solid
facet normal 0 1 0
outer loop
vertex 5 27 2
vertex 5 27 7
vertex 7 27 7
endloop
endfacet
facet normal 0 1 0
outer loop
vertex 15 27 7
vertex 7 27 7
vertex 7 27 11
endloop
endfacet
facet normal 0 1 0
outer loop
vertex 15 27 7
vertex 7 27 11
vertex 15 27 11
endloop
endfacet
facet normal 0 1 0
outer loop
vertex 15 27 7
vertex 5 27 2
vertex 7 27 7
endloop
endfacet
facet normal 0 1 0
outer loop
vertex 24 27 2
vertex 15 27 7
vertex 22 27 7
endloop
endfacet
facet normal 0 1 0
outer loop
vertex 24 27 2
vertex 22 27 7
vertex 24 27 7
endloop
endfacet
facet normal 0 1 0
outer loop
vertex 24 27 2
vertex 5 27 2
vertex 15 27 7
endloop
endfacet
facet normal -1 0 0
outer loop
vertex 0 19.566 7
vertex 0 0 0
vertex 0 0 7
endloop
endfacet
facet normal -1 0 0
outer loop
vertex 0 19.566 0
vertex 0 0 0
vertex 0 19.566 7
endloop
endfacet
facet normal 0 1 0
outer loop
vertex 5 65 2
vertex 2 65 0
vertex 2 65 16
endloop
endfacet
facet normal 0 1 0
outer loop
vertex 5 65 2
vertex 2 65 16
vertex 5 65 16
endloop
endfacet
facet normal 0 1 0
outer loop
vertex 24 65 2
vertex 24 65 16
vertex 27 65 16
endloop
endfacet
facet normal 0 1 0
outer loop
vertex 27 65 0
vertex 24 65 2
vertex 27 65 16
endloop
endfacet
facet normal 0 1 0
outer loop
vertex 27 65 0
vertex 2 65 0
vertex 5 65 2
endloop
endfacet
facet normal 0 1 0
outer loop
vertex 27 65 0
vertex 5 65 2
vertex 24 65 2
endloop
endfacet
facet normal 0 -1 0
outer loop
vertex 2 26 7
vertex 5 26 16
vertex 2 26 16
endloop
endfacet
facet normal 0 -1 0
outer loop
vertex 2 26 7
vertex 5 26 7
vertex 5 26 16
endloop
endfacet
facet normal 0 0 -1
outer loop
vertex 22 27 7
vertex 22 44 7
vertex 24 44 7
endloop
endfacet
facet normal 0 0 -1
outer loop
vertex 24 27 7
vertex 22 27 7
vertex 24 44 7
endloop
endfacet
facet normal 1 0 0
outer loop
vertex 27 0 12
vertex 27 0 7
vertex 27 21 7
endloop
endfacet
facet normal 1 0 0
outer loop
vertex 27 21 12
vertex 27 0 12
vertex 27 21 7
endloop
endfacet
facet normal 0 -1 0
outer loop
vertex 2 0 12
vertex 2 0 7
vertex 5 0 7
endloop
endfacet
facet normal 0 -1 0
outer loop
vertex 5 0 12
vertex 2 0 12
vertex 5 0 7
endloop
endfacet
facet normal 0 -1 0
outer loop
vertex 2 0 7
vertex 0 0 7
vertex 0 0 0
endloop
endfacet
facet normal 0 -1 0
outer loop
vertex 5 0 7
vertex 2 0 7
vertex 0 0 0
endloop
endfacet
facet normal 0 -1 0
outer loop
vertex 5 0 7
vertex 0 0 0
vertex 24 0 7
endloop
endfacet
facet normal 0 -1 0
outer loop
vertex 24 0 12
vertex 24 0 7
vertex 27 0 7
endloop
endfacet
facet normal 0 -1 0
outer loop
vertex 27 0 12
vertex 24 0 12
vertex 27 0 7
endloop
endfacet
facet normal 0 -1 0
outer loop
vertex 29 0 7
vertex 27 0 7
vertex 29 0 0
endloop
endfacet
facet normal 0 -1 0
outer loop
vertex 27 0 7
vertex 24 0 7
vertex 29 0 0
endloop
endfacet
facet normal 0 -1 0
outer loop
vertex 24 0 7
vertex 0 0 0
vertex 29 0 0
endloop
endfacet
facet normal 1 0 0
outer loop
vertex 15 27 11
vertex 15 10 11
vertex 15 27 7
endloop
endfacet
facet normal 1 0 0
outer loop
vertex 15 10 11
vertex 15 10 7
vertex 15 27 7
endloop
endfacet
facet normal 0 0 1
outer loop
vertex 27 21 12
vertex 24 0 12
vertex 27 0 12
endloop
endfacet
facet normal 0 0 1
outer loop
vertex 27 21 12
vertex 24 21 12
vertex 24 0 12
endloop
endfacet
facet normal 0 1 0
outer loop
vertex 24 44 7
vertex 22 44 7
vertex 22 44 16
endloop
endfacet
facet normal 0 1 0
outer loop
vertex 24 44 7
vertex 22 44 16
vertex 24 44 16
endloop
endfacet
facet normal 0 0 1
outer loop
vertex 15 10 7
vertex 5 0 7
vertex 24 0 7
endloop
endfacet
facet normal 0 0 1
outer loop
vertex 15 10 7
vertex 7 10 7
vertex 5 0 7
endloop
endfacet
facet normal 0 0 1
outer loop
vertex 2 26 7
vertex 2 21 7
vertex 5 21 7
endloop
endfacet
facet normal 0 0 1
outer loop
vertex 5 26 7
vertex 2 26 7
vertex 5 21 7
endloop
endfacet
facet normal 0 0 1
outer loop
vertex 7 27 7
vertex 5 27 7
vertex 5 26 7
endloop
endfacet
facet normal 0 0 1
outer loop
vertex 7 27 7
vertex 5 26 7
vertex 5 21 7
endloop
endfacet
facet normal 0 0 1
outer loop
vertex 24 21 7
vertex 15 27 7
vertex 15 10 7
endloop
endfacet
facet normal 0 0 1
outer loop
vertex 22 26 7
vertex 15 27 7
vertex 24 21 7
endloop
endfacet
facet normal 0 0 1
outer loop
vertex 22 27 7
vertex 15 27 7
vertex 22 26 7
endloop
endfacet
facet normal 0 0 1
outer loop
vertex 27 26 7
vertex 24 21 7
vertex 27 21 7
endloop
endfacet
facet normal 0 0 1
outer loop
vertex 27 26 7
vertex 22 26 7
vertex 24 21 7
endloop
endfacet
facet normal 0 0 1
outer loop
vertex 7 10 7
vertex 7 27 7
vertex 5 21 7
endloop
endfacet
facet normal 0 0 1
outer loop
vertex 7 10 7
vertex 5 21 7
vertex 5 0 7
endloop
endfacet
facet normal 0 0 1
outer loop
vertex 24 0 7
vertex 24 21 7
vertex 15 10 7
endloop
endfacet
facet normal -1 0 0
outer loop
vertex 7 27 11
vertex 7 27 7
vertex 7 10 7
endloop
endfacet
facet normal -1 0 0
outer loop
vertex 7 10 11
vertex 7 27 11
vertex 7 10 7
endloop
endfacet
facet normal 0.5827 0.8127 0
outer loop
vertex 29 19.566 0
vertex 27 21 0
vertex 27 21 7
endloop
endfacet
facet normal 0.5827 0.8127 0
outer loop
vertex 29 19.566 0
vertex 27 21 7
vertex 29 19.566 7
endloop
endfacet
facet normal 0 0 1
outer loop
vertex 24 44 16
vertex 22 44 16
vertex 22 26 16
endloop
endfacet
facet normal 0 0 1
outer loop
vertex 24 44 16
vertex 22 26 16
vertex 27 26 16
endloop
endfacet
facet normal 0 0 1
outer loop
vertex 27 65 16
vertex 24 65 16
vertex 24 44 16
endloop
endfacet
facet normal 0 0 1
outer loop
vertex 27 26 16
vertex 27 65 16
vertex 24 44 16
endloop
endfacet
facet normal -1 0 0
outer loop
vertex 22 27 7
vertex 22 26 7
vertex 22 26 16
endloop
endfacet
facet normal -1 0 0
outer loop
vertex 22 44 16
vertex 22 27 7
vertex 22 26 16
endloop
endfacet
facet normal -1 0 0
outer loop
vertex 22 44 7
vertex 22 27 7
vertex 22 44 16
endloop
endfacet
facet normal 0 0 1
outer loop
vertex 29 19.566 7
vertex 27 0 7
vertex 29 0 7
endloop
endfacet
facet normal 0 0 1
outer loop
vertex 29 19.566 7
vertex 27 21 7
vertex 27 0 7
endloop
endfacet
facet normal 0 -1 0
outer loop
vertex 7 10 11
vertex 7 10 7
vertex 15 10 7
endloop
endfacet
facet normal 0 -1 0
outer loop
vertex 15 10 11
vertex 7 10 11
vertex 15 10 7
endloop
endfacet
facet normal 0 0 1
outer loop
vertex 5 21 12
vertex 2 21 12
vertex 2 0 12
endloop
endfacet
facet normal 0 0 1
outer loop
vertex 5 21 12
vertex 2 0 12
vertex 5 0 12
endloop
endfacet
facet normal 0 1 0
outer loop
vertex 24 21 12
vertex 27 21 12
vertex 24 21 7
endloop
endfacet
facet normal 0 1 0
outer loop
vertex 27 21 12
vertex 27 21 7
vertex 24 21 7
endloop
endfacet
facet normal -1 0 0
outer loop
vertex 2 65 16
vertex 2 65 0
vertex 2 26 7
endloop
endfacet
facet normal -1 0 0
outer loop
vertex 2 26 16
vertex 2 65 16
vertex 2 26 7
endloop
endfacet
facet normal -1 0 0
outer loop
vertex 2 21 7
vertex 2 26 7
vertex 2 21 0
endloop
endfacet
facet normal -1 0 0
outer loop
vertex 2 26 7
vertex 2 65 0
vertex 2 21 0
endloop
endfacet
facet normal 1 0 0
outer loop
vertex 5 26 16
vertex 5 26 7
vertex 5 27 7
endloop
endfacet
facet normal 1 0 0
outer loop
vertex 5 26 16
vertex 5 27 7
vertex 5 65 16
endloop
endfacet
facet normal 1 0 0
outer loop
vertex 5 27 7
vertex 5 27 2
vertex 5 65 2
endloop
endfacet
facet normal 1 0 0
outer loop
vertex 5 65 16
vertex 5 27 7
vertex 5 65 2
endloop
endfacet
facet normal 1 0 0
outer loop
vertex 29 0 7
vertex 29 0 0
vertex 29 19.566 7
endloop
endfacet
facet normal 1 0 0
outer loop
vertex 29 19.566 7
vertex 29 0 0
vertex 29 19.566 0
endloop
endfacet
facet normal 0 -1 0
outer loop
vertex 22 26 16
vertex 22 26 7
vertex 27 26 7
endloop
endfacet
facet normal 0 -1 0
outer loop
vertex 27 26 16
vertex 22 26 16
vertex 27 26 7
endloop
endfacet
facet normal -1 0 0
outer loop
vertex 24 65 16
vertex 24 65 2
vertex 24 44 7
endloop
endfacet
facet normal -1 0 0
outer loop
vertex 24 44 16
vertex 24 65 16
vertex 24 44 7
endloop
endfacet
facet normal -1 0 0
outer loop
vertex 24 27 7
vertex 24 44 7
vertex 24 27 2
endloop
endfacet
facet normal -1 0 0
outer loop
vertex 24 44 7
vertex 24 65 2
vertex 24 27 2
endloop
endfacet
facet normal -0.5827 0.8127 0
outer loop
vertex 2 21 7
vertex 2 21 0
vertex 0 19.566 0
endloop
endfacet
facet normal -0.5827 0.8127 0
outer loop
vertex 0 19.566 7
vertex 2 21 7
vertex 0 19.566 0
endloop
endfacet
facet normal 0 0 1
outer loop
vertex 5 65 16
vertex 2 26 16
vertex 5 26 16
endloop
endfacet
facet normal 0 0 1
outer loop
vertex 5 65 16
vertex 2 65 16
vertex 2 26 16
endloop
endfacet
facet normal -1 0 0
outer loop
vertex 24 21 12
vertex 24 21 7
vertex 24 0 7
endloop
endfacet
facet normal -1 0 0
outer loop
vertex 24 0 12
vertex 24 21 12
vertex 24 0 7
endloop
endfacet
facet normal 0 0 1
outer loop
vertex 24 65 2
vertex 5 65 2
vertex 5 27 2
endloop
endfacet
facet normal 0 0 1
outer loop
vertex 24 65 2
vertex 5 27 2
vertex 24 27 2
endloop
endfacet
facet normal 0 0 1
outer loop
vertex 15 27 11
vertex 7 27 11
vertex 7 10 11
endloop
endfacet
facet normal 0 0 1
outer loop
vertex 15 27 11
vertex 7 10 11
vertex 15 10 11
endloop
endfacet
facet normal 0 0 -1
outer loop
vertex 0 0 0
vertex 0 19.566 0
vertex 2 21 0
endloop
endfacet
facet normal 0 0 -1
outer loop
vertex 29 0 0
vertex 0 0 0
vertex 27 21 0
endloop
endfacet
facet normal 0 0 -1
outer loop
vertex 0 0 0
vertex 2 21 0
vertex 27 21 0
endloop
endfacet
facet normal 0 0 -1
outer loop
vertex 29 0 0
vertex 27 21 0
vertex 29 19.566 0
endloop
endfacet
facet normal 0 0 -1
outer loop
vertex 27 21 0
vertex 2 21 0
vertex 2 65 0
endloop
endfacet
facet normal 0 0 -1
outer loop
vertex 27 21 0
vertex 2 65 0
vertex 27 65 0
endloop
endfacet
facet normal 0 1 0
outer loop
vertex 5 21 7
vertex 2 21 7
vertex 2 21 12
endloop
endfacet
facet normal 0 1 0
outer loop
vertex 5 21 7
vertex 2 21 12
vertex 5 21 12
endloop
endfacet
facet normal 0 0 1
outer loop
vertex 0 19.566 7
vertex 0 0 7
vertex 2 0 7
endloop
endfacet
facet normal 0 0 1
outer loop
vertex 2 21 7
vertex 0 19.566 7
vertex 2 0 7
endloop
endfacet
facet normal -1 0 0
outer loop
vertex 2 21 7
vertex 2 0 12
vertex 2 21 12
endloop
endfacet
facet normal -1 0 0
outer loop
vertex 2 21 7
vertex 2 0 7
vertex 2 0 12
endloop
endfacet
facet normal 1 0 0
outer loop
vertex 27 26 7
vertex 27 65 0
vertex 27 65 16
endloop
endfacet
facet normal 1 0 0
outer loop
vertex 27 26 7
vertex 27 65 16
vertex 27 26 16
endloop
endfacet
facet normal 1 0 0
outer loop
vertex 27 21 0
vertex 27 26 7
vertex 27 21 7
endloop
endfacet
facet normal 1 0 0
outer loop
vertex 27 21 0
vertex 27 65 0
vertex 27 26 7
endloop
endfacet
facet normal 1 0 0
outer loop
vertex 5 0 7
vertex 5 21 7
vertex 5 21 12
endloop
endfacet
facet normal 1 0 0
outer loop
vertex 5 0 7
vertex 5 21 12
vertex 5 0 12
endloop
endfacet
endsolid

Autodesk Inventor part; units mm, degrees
ref_plane "YZ Plane" through (0, 0, 0) normal (1, 0, 0) x (0, 1, 0)
ref_plane "XZ Plane" through (0, 0, 0) normal (0, 1, 0) x (-1, 0, 0)
ref_plane "XY Plane" through (0, 0, 0) normal (0, 0, 1) x (1, 0, 0)
sketch "Boceto1" plane through (0, 0, 0) normal (0, 0, 1) x (1, 0, 0)
  line L0 (0, 0) -> (0, 19.566)
  line L1 (2, 65) -> (2, 21)
  line L2 (2, 21) -> (0, 19.566)
  line L3 (2, 65) -> (14.5, 65)
  line L4 (29, 0) -> (29, 19.566)
  line L5 (27, 65) -> (27, 21)
  line L6 (27, 21) -> (29, 19.566)
  line L7 (27, 65) -> (14.5, 65)
  line L8 (0, 0) -> (29, 0)
extrude "Extrusión1" add sketch "Boceto1" along normal blind 7
sketch "Boceto2" plane through (0, 0, 7) normal (0, 0, 1) x (1, 0, 0)
  line L0 (27, 65) -> (27, 21) projected
  line L1 (2, 65) -> (27, 65) projected
  line L2 (2, 21) -> (2, 65) projected
  line L3 (2, 65) -> (5, 65)
  line L4 (2, 65) -> (2, 26)
  line L5 (5, 26) -> (5, 65)
  line L6 (27, 65) -> (24, 65)
  line L7 (24, 65) -> (24, 44)
  line L8 (27, 65) -> (27, 26)
  line L9 (5, 26) -> (2, 26)
  line L10 (24, 26) -> (27, 26)
  line L11 (24.1227, 26) -> (22, 26)
  line L12 (22, 26) -> (22, 44)
  line L13 (22, 44) -> (24, 44)
  dimension "d7" = 18
extrude "Extrusión2" add sketch "Boceto2" along normal blind 9
sketch "Boceto3" plane through (0, 0, 7) normal (0, 0, 1) x (1, 0, 0)
  line L0 (5, 65) -> (24, 65) projected
  line L1 (29, 0) -> (0, 0) projected
  line L2 (22, 44) -> (24, 44) projected
  line L3 (2, 0) -> (2, 21)
  line L4 (2, 21) -> (5, 21)
  line L5 (5, 21) -> (5, 0)
  line L6 (5, 0) -> (2, 0)
  line L7 (27, 0) -> (27, 21)
  line L8 (27, 21) -> (24, 21)
  line L9 (24, 21) -> (24, 0)
  line L10 (24, 0) -> (27, 0)
  dimension "d9" = 21
extrude "Extrusión3" add sketch "Boceto3" along normal blind 5
sketch "Boceto4" plane through (0, 0, 7) normal (0, 0, 1) x (1, 0, 0)
  line L0 (29, 0) -> (0, 0) projected
  line L1 (7, 10) -> (15, 10)
  line L2 (15, 10) -> (15, 27)
  line L3 (15, 27) -> (7, 27)
  line L4 (7, 27) -> (7, 10)
  dimension "d22" = 8
extrude "Extrusión4" add sketch "Boceto4" along normal blind 4
sketch "Sketch5" plane through (2, 65, 0) normal (0, 1, 0) x (1, 0, 0)
  line L0 (3, -7) -> (22, -7) projected
  line L1 (0, 0) -> (25, 0) projected
  line L2 (3, -7) -> (3, -16) projected
  line L3 (22, 2) -> (3, 2)
  line L4 (3, 2) -> (3, -2)
  line L5 (3, -2) -> (22, -2)
  line L6 (22, -2) -> (22, 2)
  line L7 (22, 2) -> (3, -2) construction
  line L8 (3, 2) -> (22, -2) construction
  line L9 (3, -2) -> (3, -7)
  line L10 (22, -7) -> (22, -2)
  line L11 (3, -7) -> (22, -7)
  point P0 (-2, 0)
  point P1 (12.5, 0)
  dimension "d23" = 4
extrude "Extrusion5" cut sketch "Sketch5" against normal up to surface (38 mm away) contours L9 L5 L10 L0
properties part number "fio"
